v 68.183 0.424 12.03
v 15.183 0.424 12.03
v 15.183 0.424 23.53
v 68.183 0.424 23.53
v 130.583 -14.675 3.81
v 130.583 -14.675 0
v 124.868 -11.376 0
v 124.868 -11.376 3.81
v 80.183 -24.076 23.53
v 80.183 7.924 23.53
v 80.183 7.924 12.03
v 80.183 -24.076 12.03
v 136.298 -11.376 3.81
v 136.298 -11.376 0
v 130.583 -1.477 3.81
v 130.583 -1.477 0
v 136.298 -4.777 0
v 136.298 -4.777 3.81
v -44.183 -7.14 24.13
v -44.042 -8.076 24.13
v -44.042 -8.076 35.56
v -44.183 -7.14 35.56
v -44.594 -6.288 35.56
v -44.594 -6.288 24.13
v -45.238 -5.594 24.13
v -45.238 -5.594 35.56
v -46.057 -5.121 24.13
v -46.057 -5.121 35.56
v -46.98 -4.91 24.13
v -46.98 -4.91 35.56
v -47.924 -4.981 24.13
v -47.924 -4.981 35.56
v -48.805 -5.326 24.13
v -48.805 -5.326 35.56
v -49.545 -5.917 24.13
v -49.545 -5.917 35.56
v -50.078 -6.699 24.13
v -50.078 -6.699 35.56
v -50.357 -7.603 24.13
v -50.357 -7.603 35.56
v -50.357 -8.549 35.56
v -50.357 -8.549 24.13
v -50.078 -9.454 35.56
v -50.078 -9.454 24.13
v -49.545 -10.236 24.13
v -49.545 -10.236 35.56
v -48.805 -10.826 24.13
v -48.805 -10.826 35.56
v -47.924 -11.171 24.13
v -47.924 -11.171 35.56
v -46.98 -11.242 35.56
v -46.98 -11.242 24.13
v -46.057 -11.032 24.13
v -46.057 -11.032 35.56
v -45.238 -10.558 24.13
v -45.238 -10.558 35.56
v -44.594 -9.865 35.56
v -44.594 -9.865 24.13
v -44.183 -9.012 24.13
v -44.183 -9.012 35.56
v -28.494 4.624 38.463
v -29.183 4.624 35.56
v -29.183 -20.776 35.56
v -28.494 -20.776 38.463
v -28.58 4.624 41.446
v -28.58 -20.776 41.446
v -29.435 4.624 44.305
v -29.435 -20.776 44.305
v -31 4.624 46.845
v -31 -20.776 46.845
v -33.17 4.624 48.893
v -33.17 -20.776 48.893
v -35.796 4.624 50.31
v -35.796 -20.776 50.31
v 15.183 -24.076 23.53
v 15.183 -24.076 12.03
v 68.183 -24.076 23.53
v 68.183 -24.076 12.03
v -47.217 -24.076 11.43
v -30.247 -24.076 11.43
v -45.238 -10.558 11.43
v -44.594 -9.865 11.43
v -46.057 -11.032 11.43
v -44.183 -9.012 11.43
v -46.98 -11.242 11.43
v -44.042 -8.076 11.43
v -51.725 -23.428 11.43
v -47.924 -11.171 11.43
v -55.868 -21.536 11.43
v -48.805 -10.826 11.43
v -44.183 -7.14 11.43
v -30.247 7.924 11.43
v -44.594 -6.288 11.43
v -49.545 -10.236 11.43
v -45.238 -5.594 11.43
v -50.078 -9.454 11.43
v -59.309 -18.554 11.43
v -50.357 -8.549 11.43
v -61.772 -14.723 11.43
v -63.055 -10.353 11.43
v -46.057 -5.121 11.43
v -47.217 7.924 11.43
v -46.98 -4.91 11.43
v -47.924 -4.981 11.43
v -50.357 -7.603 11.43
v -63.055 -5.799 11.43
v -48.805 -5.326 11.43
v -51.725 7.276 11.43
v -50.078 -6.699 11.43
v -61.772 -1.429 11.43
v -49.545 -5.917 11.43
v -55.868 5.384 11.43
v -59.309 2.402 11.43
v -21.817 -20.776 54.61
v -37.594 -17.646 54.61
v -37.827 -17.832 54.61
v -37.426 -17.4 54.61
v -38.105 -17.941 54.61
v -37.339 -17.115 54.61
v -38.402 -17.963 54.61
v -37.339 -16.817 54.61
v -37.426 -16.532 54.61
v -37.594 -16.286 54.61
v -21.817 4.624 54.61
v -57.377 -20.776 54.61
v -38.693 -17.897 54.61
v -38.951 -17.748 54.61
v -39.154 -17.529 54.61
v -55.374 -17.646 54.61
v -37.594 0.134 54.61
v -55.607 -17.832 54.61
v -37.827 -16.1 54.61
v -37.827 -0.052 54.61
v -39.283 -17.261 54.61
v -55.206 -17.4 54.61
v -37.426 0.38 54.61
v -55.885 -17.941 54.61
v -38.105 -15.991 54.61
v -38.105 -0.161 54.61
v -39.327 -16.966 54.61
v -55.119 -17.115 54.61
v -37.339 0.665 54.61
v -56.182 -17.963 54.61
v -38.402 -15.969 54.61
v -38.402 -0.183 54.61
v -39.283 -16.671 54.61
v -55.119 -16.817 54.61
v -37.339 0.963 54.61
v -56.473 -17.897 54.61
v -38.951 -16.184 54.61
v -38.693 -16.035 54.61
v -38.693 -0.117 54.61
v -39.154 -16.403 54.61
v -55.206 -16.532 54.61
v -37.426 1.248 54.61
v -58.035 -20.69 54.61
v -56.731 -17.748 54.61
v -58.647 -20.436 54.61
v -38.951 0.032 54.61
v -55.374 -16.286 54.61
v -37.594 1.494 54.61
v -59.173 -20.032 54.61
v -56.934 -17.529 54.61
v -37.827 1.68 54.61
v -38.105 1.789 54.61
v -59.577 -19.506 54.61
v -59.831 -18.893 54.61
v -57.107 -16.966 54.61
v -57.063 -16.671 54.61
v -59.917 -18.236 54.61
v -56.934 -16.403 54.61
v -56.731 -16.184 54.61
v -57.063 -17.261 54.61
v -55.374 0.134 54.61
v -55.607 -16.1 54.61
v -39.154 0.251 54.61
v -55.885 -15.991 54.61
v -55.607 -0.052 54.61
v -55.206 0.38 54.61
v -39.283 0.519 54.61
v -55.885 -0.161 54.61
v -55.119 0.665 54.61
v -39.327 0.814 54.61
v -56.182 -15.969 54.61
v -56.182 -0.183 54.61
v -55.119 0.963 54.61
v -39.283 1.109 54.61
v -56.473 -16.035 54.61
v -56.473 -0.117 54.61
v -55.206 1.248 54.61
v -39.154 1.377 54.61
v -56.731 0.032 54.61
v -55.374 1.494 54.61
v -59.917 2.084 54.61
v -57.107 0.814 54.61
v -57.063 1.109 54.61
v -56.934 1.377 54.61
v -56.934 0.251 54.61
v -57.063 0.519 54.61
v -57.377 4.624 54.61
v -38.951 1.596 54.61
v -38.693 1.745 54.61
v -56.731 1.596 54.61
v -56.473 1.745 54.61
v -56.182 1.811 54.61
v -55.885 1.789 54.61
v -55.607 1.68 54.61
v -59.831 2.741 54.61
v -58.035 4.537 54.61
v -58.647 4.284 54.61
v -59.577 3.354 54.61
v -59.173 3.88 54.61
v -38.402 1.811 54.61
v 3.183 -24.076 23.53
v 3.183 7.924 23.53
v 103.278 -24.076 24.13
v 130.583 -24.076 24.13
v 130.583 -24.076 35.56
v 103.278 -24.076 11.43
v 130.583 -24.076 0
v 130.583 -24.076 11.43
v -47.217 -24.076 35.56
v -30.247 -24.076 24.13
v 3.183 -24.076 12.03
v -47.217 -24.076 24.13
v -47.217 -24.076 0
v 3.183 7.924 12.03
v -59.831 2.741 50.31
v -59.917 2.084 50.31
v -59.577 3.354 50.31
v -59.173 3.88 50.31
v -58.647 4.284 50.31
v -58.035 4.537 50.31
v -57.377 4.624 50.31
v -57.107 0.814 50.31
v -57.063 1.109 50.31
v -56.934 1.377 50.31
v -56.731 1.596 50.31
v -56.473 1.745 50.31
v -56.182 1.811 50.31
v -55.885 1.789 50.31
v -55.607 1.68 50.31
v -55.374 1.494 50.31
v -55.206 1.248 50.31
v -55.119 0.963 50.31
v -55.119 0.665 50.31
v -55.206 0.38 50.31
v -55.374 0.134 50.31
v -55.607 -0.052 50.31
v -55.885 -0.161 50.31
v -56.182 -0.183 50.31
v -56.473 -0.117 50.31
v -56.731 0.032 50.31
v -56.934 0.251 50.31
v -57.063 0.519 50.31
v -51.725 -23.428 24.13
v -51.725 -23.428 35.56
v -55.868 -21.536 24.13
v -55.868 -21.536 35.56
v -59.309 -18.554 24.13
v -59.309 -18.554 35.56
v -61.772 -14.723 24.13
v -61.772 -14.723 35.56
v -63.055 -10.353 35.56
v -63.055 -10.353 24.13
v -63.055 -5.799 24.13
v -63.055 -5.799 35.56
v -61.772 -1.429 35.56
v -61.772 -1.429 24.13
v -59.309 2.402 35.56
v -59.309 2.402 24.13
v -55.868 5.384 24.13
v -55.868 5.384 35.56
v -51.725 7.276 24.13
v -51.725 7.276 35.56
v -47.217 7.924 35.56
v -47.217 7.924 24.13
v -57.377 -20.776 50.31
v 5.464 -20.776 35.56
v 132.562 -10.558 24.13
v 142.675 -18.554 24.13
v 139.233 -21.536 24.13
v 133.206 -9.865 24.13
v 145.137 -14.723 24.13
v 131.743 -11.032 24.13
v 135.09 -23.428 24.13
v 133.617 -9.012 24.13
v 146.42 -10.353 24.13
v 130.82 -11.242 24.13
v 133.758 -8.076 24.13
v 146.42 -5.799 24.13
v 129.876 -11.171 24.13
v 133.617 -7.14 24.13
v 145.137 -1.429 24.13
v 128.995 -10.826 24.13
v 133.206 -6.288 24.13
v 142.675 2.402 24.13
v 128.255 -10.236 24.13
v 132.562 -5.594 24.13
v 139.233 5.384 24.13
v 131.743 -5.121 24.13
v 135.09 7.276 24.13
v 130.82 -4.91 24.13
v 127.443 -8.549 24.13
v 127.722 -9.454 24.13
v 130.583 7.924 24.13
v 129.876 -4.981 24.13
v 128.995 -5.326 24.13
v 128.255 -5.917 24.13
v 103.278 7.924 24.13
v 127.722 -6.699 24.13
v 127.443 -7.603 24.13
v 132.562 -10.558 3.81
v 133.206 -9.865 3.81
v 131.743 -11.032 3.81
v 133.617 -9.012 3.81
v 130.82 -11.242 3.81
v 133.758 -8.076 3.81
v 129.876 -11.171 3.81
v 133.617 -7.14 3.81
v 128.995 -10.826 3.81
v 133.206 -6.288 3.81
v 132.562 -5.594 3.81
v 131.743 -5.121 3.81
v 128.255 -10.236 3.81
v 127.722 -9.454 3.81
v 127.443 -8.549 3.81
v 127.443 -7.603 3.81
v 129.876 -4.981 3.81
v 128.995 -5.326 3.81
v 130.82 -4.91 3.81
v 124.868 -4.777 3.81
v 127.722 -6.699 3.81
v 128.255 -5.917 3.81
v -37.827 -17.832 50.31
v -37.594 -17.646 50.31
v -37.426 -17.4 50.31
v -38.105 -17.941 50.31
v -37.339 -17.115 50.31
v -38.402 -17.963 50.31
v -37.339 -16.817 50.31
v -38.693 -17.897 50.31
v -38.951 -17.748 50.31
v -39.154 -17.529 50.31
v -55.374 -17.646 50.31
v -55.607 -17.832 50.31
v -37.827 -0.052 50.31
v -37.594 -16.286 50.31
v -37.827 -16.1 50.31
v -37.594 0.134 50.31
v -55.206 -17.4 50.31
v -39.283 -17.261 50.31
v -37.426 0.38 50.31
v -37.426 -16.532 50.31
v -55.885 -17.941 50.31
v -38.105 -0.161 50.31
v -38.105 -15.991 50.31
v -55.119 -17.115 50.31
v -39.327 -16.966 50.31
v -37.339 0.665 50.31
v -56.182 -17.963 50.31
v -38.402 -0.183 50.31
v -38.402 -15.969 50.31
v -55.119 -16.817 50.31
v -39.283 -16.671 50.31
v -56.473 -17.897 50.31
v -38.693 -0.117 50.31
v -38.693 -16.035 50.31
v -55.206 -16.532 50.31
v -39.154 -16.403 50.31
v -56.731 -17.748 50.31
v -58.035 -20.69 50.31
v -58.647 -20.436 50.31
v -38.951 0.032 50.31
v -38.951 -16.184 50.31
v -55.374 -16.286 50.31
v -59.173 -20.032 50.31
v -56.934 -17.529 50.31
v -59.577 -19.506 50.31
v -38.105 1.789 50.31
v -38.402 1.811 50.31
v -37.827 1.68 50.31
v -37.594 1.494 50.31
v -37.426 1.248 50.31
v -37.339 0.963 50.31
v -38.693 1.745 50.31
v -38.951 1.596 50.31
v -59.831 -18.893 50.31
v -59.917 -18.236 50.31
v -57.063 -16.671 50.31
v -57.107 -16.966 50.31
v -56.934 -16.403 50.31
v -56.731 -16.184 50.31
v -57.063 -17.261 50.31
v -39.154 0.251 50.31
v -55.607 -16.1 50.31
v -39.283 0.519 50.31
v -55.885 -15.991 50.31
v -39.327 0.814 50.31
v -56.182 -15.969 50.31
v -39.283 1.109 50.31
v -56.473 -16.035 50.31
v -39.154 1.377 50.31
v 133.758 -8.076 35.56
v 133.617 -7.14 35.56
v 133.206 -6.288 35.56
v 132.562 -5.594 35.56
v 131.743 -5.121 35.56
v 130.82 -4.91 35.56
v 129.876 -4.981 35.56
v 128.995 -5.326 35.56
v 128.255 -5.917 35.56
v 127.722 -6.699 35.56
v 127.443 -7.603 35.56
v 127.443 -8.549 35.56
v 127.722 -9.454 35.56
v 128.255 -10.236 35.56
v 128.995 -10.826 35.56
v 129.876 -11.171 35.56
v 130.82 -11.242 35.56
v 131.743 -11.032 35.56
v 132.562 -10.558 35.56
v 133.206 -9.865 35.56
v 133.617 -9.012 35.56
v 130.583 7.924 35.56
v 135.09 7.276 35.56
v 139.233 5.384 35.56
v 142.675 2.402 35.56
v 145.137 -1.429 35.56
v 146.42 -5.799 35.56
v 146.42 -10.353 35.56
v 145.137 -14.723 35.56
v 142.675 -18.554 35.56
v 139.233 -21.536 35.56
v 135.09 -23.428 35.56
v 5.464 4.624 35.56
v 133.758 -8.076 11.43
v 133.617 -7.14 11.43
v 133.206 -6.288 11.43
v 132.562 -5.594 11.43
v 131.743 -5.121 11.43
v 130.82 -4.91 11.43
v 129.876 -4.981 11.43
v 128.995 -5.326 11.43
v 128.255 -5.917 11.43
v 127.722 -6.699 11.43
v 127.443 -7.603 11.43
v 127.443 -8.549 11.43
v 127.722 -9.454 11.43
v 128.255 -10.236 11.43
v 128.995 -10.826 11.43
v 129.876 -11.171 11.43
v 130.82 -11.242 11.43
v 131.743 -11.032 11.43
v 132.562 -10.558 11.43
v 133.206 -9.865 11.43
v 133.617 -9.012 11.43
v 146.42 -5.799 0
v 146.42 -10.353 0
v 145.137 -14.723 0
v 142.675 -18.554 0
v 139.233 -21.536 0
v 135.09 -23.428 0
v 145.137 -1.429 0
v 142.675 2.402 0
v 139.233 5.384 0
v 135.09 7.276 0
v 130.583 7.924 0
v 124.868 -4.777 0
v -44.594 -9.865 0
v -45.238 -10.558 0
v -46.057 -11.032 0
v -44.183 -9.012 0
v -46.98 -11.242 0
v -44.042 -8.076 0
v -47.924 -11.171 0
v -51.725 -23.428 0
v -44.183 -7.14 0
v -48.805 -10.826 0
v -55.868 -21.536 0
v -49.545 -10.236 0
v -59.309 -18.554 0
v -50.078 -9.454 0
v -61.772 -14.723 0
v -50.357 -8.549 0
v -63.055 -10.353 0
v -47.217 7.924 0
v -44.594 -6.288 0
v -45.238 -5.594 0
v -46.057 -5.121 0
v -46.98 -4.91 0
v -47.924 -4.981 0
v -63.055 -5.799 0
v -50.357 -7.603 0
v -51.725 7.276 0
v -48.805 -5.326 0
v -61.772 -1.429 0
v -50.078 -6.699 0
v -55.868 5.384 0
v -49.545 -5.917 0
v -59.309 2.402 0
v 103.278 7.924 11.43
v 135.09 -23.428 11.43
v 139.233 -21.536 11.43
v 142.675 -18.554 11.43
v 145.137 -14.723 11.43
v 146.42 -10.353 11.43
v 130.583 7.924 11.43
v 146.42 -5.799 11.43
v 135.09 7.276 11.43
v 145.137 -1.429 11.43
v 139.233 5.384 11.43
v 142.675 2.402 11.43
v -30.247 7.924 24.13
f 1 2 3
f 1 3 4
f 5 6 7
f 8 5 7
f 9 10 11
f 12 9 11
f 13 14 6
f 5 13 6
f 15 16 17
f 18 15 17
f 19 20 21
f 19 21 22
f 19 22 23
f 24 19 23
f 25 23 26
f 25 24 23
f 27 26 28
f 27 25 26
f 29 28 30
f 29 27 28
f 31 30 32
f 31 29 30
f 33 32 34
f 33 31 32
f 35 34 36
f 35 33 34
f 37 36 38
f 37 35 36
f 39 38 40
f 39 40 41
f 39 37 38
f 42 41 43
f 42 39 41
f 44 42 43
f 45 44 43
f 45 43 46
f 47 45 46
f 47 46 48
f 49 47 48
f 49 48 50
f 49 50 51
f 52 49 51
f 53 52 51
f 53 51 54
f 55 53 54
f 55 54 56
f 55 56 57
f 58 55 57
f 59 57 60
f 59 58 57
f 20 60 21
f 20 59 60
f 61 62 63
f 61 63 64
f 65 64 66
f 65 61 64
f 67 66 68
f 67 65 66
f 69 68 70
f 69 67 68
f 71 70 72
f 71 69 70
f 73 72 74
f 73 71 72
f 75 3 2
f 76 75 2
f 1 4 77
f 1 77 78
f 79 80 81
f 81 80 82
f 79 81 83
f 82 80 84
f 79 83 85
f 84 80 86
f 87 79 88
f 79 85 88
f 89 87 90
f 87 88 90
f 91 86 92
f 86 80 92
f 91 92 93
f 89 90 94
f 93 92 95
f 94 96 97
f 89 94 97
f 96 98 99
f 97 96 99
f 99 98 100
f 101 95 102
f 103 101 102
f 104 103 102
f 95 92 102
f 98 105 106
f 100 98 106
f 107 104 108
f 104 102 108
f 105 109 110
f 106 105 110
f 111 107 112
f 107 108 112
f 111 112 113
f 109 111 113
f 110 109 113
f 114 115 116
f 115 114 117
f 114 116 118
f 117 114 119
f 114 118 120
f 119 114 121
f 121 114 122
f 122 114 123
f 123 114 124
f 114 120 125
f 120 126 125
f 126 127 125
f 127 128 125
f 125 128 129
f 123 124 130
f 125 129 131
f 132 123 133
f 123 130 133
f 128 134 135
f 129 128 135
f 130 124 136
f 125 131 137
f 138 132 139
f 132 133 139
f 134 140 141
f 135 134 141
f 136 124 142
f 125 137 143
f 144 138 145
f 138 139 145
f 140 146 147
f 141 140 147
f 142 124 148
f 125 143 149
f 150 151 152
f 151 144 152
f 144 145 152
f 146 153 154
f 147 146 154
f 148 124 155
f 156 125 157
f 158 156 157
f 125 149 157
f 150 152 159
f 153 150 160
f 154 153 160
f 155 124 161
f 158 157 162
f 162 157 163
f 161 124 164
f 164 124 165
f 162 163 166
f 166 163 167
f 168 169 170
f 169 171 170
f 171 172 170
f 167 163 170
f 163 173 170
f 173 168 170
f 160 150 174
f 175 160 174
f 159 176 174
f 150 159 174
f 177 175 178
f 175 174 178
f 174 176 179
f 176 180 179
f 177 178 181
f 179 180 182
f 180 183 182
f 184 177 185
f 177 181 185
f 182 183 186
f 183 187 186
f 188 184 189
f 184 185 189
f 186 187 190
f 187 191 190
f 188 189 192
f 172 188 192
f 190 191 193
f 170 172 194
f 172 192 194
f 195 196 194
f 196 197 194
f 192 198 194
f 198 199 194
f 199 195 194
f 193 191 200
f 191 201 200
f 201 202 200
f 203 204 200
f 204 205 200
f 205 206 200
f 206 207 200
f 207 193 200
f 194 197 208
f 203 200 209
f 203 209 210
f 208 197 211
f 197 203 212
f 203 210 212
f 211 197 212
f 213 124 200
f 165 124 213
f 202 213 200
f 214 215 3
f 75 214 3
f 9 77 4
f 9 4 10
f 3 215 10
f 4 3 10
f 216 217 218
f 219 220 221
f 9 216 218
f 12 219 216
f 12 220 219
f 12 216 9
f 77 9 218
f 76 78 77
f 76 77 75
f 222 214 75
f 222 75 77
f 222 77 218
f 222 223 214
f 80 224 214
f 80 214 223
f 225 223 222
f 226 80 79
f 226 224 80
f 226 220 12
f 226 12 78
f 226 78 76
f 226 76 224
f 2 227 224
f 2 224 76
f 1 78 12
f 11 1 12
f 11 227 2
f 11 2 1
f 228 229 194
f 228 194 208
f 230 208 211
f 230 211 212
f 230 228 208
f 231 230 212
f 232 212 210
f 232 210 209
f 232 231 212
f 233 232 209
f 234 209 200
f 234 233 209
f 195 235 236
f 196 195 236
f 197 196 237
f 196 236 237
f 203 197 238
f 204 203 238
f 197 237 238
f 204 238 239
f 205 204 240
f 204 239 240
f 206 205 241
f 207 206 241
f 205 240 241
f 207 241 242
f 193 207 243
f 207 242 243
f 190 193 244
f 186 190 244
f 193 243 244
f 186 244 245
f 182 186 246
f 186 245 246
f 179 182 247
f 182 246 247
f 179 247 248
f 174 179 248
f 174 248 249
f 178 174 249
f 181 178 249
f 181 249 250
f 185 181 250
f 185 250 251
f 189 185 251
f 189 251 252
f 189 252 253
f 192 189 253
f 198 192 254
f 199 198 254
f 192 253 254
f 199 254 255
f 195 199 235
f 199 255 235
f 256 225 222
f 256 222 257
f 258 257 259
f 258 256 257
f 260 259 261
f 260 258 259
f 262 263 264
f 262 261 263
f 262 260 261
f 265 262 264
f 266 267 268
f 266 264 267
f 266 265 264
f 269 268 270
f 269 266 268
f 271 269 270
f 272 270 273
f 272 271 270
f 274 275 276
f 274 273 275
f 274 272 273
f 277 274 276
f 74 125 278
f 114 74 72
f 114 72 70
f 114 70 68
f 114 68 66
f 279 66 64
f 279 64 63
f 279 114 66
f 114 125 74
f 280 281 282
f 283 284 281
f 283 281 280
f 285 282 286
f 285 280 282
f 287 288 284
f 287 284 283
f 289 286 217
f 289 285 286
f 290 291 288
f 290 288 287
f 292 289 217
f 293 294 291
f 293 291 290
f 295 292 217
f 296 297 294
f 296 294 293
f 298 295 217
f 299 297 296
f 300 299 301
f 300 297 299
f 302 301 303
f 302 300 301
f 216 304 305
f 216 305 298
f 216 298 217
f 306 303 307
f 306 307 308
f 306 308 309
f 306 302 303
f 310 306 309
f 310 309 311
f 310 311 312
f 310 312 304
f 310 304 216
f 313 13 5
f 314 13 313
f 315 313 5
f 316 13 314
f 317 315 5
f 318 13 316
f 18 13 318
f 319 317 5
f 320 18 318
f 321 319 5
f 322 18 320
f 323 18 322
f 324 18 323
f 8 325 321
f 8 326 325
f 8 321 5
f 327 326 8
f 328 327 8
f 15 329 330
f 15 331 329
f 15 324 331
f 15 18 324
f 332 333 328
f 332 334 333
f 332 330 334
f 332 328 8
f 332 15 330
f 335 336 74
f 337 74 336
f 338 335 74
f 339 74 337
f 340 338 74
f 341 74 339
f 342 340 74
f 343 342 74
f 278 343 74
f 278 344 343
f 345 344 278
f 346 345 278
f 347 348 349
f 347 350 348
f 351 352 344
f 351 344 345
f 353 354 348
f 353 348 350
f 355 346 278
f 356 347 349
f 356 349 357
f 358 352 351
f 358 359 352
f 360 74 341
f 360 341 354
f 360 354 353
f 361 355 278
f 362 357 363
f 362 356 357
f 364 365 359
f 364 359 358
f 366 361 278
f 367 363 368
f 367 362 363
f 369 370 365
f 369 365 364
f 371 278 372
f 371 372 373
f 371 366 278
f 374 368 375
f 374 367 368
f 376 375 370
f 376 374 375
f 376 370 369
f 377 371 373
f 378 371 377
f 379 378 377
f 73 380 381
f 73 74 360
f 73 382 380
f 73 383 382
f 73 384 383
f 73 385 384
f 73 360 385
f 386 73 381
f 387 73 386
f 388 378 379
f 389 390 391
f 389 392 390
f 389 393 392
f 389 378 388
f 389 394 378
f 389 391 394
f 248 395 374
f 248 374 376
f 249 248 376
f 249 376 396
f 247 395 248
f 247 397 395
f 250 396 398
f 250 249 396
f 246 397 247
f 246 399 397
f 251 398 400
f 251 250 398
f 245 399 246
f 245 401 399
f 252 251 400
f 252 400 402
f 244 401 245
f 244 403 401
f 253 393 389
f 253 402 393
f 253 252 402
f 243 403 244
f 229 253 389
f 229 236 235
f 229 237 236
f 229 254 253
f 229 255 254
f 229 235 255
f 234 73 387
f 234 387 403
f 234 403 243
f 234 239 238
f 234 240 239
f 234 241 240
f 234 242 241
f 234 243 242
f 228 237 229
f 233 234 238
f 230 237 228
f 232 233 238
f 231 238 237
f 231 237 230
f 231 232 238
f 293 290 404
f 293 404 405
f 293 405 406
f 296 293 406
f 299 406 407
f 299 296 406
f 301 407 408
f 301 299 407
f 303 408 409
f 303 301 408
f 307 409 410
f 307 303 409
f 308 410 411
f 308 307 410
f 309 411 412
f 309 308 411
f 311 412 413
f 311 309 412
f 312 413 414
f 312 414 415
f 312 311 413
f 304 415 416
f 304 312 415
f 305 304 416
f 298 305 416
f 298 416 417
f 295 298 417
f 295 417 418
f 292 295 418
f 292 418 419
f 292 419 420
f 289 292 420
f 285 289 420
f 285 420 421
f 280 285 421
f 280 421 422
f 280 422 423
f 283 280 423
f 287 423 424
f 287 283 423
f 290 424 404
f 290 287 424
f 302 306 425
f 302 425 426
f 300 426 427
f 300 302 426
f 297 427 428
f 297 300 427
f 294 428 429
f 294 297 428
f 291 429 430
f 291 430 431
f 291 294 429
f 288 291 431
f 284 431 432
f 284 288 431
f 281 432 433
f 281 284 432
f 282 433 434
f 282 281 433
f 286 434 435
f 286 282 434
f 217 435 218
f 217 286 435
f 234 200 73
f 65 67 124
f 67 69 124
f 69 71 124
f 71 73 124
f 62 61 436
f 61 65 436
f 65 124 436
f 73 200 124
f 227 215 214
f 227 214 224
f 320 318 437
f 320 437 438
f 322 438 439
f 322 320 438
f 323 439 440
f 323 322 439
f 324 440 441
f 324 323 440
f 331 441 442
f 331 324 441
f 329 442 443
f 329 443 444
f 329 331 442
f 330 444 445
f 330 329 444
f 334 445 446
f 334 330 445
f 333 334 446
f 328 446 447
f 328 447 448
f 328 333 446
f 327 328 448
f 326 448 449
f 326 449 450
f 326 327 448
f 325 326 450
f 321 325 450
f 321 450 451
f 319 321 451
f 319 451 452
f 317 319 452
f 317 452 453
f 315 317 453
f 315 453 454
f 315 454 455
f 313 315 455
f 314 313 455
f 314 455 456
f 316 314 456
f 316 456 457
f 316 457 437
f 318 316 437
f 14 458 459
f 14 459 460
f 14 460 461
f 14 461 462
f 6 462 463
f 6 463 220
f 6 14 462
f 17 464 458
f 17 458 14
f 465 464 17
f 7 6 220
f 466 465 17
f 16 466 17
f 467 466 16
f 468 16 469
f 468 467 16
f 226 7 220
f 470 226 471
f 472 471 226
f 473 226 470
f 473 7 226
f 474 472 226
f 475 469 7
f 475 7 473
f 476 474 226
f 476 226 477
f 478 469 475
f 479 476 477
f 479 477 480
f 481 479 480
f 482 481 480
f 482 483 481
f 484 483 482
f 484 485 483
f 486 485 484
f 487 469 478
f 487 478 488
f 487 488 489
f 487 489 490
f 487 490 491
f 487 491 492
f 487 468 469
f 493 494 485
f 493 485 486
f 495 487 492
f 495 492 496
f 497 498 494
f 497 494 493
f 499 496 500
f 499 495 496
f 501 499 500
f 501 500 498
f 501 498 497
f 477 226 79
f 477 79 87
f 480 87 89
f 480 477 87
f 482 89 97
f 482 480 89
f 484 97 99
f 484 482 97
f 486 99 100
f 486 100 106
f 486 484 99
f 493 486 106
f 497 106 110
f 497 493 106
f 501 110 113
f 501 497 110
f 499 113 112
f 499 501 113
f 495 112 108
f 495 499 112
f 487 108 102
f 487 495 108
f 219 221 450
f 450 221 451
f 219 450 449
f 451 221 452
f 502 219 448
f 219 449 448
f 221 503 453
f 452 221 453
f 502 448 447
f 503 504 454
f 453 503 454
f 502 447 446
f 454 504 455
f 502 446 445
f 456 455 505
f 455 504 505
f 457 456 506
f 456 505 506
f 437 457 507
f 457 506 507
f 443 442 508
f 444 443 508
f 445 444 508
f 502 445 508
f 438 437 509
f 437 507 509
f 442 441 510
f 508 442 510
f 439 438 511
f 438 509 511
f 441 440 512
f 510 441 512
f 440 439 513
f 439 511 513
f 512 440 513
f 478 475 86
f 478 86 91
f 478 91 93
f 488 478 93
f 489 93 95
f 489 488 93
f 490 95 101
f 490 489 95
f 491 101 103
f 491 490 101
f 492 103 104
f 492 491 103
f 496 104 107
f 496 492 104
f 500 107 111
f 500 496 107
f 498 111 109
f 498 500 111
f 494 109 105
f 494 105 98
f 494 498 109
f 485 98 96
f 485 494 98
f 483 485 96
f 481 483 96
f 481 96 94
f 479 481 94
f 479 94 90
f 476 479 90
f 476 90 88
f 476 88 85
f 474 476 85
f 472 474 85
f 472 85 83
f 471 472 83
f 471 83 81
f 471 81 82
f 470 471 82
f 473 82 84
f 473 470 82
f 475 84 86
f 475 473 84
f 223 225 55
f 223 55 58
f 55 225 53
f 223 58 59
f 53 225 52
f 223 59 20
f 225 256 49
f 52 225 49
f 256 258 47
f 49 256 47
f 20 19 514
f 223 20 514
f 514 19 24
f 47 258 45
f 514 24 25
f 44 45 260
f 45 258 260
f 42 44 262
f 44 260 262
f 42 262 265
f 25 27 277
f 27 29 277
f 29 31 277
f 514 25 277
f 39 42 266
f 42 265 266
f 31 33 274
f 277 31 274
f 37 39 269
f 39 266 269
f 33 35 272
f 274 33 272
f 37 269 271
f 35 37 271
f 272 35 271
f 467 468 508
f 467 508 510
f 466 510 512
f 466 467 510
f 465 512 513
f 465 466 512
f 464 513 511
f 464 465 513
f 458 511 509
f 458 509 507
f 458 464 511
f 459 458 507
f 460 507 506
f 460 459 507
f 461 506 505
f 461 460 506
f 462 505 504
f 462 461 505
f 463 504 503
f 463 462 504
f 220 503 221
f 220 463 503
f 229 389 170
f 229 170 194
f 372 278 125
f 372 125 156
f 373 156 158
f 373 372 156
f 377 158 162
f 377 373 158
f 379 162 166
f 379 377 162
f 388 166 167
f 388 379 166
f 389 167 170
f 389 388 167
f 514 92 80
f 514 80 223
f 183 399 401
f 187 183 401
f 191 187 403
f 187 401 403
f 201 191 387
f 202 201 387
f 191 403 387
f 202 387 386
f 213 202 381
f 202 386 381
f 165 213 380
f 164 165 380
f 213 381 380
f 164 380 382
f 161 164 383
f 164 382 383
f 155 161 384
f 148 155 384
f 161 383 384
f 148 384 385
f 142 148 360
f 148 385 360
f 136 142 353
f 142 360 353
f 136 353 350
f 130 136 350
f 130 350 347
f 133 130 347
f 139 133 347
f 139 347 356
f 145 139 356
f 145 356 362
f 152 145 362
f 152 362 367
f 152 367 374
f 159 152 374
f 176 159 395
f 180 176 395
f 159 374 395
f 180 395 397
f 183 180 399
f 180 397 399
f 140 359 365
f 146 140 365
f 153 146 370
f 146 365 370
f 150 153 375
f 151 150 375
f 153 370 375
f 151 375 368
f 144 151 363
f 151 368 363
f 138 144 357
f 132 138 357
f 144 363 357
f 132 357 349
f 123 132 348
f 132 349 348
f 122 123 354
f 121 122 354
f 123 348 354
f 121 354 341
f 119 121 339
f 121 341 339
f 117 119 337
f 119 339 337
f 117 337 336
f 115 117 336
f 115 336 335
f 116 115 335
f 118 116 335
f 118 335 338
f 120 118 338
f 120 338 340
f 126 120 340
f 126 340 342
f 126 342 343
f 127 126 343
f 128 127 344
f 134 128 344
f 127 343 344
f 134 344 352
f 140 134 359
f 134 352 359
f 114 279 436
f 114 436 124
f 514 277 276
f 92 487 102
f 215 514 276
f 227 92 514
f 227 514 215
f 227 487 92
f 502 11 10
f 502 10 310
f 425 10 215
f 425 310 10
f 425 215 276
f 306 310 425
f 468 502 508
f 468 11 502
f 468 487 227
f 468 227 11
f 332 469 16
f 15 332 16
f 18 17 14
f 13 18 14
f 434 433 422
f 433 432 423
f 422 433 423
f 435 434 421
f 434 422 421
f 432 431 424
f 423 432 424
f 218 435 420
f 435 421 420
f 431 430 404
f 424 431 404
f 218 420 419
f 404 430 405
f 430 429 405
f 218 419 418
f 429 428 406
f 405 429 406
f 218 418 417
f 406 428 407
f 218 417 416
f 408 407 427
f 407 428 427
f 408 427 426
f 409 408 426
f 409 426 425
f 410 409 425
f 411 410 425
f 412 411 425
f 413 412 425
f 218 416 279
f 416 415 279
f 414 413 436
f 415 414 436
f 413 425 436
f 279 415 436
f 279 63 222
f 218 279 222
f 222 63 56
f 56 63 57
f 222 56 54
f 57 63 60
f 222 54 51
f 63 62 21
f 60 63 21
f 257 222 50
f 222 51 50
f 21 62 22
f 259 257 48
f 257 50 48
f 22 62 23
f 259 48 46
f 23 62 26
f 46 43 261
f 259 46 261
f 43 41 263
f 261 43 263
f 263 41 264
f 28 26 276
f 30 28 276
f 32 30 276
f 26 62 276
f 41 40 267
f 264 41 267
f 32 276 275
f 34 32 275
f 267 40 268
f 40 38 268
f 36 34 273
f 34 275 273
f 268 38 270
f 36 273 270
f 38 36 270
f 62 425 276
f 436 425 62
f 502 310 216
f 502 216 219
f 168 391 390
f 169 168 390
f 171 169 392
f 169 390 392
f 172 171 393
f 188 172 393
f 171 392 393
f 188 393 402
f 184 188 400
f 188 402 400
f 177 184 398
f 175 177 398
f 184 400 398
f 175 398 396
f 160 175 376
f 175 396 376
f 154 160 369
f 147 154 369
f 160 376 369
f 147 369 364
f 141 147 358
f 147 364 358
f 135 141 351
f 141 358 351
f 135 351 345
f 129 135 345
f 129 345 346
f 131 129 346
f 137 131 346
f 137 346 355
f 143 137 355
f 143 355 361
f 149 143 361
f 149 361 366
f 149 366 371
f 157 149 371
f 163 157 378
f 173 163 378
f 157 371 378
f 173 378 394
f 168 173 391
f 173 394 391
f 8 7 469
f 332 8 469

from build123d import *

# Parameters (mm, degrees)
SKETCH1_R           = 3.175
BOSS_EXTRUDE1_DEPTH = 11.43
SKETCH2_W           = 161.464261653
SKETCH2_H           = 32
BOSS_EXTRUDE2_DEPTH = 12.7
SKETCH5_R           = 3.175
BOSS_EXTRUDE3_DEPTH = 11.43
SKETCH6_W           = 77
SKETCH6_H           = 11.5
CUT_EXTRUDE1_DEPTH  = 7.5
BOSS_EXTRUDE4_DEPTH = 19.05
CUT_EXTRUDE3_DEPTH  = 30.48
BOSS_EXTRUDE5_DEPTH = 25.4
SKETCH7_W           = 12
SKETCH7_H           = 11.5
CUT_EXTRUDE4_DEPTH  = 50.8
SKETCH7_5_W         = 12
SKETCH7_5_H         = 11.5
CUT_EXTRUDE5_DEPTH  = 50.8
SKETCH16_W          = 12.7
SKETCH16_H          = 32
CUT_EXTRUDE6_DEPTH  = 8.89
SKETCH17_R          = 1
CUT_EXTRUDE7_DEPTH  = 4.299778595
SKETCH18_W          = 12.7
SKETCH18_H          = 32
CUT_EXTRUDE8_DEPTH  = 19.05
CUT_EXTRUDE9_DEPTH  = 3.81


with BuildPart() as part:
    # Sketch1 → Boss-Extrude1 (new body)
    with BuildSketch(Plane.XY):
        with BuildLine():
            Line((-47.217391304, 7.923913043), (130.582608696, 7.923913043))
            ThreePointArc((130.582608696, 7.923913043), (146.582608696, -8.076086957), (130.582608696, -24.076086957))
            Line((130.582608696, -24.076086957), (-47.217391304, -24.076086957))
            ThreePointArc((-47.217391304, -24.076086957), (-63.217391304, -8.076086957), (-47.217391304, 7.923913043))
        make_face()
        with Locations((-47.217391304, -8.076086957)):
            Circle(SKETCH1_R, mode=Mode.SUBTRACT)
        with Locations((130.582608696, -8.076086957)):
            Circle(SKETCH1_R, mode=Mode.SUBTRACT)
    extrude(amount=BOSS_EXTRUDE1_DEPTH)

    # Sketch2 → Boss-Extrude2 (add)
    with BuildSketch(Plane.XY.offset(11.43)):
        with Locations((41.59547787, -8.076086957)):
            Rectangle(SKETCH2_W, SKETCH2_H)
    extrude(amount=BOSS_EXTRUDE2_DEPTH)

    # Sketch5 → Boss-Extrude3 (add)
    with BuildSketch(Plane.XY.offset(24.13)):
        with BuildLine():
            Line((-47.217391304, 7.923913043), (130.582608696, 7.923913043))
            ThreePointArc((130.582608696, 7.923913043), (146.582608696, -8.076086957), (130.582608696, -24.076086957))
            Line((130.582608696, -24.076086957), (-47.217391304, -24.076086957))
            ThreePointArc((-47.217391304, -24.076086957), (-63.217391304, -8.076086957), (-47.217391304, 7.923913043))
        make_face()
        with Locations((-47.217391304, -8.076086957)):
            Circle(SKETCH5_R, mode=Mode.SUBTRACT)
        with Locations((130.582608696, -8.076086957)):
            Circle(SKETCH5_R, mode=Mode.SUBTRACT)
    extrude(amount=BOSS_EXTRUDE3_DEPTH)

    # Sketch6 → Cut-Extrude1 (cut)
    with BuildSketch(Plane(origin=(0, 7.923913043, 0), x_dir=(1, 0, 0), z_dir=(0, 1, 0))):
        with Locations((41.682608696, -17.78)):
            Rectangle(SKETCH6_W, SKETCH6_H)
    extrude(amount=-CUT_EXTRUDE1_DEPTH, mode=Mode.SUBTRACT)

    # Sketch10 → Boss-Extrude4 (add)
    with BuildSketch(Plane.XY.offset(35.56)):
        with BuildLine():
            Line((-34.517391304, -20.776086957), (-57.377391304, -20.776086957))
            ThreePointArc((-57.377391304, -20.776086957), (-59.173442529, -20.032138181), (-59.917391304, -18.236086957))
            Line((-59.917391304, -18.236086957), (-59.917391304, 2.083913043))
            ThreePointArc((-59.917391304, 2.083913043), (-59.173442529, 3.879964268), (-57.377391304, 4.623913043))
            Line((-57.377391304, 4.623913043), (-34.517391304, 4.623913043))
            Line((-34.517391304, 4.623913043), (-21.817391304, 4.623913043))
            Line((-21.817391304, 4.623913043), (-21.817391304, -20.776086957))
            Line((-21.817391304, -20.776086957), (-34.517391304, -20.776086957))
        make_face()
    extrude(amount=BOSS_EXTRUDE4_DEPTH)

    # Sketch14 → Cut-Extrude3 (cut)
    with BuildSketch(Plane(origin=(0, 4.623913043, 0), x_dir=(1, 0, 0), z_dir=(0, 1, 0))):
        with BuildLine():
            Line((-59.917391304, -35.56), (-29.183391304, -35.56))
            ThreePointArc((-29.183391304, -35.56), (-29.434604535, -44.304535578), (-35.79555952, -50.310221405))
            Line((-35.79555952, -50.310221405), (-59.917391304, -50.310221405))
            Line((-59.917391304, -50.310221405), (-59.917391304, -35.56))
        make_face()
    extrude(amount=-CUT_EXTRUDE3_DEPTH, mode=Mode.SUBTRACT)

    # Sketch15 → Boss-Extrude5 (add)
    with BuildSketch(Plane.XZ.offset(20.776086957)):
        Polygon((-21.817391304, 35.56), (5.46367495, 35.56), (-21.817391304, 54.61), align=None)
    extrude(amount=-BOSS_EXTRUDE5_DEPTH)

    # Sketch7 → Cut-Extrude4 (cut)
    with BuildSketch(Plane(origin=(0, 0.423913043, 0), x_dir=(1, 0, 0), z_dir=(0, 1, 0))):
        with Locations((74.182608696, -17.78)):
            Rectangle(SKETCH7_W, SKETCH7_H)
    extrude(amount=-CUT_EXTRUDE4_DEPTH, mode=Mode.SUBTRACT)

    # Sketch7<5> → Cut-Extrude5 (cut)
    with BuildSketch(Plane(origin=(0, 0.423913043, 0), x_dir=(1, 0, 0), z_dir=(0, 1, 0))):
        with Locations((9.182608696, -17.78)):
            Rectangle(SKETCH7_5_W, SKETCH7_5_H)
    extrude(amount=-CUT_EXTRUDE5_DEPTH, mode=Mode.SUBTRACT)

    # Sketch16 → Cut-Extrude6 (cut)
    with BuildSketch(Plane.ZY.offset(39.136652957)):
        with Locations((17.78, -8.076086957)):
            Rectangle(SKETCH16_W, SKETCH16_H)
    extrude(amount=-CUT_EXTRUDE6_DEPTH, mode=Mode.SUBTRACT)

    # Sketch17 → Cut-Extrude7 (cut)
    with BuildSketch(Plane(origin=(0, 0, 50.310221405), x_dir=(-1, 0, 0), z_dir=(0, 0, -1))):
        with Locations((38.327391304, 0.813913043)):
            Circle(SKETCH17_R)
        with Locations((56.107391304, 0.813913043)):
            Circle(SKETCH17_R)
        with Locations((56.107391304, -16.966086957)):
            Circle(SKETCH17_R)
        with Locations((38.327391304, -16.966086957)):
            Circle(SKETCH17_R)
    extrude(amount=-CUT_EXTRUDE7_DEPTH, mode=Mode.SUBTRACT)

    # Sketch18 → Cut-Extrude8 (cut)
    with BuildSketch(Plane(origin=(122.327608696, 0, 0), x_dir=(0, 0, -1), z_dir=(1, 0, 0))):
        with Locations((-17.78, -8.076086957)):
            Rectangle(SKETCH18_W, SKETCH18_H)
    extrude(amount=-CUT_EXTRUDE8_DEPTH, mode=Mode.SUBTRACT)

    # Sketch19 → Cut-Extrude9 (cut)
    with BuildSketch(Plane(origin=(0, 0, 0), x_dir=(-1, 0, 0), z_dir=(0, 0, -1))):
        Polygon((-130.582608696, -1.47697338), (-136.297608696, -4.776530168), (-136.297608696, -11.375643745), (-130.582608696, -14.675200533), (-124.867608696, -11.375643745), (-124.867608696, -4.776530168), align=None)
    extrude(amount=-CUT_EXTRUDE9_DEPTH, mode=Mode.SUBTRACT)


solid = part.part
